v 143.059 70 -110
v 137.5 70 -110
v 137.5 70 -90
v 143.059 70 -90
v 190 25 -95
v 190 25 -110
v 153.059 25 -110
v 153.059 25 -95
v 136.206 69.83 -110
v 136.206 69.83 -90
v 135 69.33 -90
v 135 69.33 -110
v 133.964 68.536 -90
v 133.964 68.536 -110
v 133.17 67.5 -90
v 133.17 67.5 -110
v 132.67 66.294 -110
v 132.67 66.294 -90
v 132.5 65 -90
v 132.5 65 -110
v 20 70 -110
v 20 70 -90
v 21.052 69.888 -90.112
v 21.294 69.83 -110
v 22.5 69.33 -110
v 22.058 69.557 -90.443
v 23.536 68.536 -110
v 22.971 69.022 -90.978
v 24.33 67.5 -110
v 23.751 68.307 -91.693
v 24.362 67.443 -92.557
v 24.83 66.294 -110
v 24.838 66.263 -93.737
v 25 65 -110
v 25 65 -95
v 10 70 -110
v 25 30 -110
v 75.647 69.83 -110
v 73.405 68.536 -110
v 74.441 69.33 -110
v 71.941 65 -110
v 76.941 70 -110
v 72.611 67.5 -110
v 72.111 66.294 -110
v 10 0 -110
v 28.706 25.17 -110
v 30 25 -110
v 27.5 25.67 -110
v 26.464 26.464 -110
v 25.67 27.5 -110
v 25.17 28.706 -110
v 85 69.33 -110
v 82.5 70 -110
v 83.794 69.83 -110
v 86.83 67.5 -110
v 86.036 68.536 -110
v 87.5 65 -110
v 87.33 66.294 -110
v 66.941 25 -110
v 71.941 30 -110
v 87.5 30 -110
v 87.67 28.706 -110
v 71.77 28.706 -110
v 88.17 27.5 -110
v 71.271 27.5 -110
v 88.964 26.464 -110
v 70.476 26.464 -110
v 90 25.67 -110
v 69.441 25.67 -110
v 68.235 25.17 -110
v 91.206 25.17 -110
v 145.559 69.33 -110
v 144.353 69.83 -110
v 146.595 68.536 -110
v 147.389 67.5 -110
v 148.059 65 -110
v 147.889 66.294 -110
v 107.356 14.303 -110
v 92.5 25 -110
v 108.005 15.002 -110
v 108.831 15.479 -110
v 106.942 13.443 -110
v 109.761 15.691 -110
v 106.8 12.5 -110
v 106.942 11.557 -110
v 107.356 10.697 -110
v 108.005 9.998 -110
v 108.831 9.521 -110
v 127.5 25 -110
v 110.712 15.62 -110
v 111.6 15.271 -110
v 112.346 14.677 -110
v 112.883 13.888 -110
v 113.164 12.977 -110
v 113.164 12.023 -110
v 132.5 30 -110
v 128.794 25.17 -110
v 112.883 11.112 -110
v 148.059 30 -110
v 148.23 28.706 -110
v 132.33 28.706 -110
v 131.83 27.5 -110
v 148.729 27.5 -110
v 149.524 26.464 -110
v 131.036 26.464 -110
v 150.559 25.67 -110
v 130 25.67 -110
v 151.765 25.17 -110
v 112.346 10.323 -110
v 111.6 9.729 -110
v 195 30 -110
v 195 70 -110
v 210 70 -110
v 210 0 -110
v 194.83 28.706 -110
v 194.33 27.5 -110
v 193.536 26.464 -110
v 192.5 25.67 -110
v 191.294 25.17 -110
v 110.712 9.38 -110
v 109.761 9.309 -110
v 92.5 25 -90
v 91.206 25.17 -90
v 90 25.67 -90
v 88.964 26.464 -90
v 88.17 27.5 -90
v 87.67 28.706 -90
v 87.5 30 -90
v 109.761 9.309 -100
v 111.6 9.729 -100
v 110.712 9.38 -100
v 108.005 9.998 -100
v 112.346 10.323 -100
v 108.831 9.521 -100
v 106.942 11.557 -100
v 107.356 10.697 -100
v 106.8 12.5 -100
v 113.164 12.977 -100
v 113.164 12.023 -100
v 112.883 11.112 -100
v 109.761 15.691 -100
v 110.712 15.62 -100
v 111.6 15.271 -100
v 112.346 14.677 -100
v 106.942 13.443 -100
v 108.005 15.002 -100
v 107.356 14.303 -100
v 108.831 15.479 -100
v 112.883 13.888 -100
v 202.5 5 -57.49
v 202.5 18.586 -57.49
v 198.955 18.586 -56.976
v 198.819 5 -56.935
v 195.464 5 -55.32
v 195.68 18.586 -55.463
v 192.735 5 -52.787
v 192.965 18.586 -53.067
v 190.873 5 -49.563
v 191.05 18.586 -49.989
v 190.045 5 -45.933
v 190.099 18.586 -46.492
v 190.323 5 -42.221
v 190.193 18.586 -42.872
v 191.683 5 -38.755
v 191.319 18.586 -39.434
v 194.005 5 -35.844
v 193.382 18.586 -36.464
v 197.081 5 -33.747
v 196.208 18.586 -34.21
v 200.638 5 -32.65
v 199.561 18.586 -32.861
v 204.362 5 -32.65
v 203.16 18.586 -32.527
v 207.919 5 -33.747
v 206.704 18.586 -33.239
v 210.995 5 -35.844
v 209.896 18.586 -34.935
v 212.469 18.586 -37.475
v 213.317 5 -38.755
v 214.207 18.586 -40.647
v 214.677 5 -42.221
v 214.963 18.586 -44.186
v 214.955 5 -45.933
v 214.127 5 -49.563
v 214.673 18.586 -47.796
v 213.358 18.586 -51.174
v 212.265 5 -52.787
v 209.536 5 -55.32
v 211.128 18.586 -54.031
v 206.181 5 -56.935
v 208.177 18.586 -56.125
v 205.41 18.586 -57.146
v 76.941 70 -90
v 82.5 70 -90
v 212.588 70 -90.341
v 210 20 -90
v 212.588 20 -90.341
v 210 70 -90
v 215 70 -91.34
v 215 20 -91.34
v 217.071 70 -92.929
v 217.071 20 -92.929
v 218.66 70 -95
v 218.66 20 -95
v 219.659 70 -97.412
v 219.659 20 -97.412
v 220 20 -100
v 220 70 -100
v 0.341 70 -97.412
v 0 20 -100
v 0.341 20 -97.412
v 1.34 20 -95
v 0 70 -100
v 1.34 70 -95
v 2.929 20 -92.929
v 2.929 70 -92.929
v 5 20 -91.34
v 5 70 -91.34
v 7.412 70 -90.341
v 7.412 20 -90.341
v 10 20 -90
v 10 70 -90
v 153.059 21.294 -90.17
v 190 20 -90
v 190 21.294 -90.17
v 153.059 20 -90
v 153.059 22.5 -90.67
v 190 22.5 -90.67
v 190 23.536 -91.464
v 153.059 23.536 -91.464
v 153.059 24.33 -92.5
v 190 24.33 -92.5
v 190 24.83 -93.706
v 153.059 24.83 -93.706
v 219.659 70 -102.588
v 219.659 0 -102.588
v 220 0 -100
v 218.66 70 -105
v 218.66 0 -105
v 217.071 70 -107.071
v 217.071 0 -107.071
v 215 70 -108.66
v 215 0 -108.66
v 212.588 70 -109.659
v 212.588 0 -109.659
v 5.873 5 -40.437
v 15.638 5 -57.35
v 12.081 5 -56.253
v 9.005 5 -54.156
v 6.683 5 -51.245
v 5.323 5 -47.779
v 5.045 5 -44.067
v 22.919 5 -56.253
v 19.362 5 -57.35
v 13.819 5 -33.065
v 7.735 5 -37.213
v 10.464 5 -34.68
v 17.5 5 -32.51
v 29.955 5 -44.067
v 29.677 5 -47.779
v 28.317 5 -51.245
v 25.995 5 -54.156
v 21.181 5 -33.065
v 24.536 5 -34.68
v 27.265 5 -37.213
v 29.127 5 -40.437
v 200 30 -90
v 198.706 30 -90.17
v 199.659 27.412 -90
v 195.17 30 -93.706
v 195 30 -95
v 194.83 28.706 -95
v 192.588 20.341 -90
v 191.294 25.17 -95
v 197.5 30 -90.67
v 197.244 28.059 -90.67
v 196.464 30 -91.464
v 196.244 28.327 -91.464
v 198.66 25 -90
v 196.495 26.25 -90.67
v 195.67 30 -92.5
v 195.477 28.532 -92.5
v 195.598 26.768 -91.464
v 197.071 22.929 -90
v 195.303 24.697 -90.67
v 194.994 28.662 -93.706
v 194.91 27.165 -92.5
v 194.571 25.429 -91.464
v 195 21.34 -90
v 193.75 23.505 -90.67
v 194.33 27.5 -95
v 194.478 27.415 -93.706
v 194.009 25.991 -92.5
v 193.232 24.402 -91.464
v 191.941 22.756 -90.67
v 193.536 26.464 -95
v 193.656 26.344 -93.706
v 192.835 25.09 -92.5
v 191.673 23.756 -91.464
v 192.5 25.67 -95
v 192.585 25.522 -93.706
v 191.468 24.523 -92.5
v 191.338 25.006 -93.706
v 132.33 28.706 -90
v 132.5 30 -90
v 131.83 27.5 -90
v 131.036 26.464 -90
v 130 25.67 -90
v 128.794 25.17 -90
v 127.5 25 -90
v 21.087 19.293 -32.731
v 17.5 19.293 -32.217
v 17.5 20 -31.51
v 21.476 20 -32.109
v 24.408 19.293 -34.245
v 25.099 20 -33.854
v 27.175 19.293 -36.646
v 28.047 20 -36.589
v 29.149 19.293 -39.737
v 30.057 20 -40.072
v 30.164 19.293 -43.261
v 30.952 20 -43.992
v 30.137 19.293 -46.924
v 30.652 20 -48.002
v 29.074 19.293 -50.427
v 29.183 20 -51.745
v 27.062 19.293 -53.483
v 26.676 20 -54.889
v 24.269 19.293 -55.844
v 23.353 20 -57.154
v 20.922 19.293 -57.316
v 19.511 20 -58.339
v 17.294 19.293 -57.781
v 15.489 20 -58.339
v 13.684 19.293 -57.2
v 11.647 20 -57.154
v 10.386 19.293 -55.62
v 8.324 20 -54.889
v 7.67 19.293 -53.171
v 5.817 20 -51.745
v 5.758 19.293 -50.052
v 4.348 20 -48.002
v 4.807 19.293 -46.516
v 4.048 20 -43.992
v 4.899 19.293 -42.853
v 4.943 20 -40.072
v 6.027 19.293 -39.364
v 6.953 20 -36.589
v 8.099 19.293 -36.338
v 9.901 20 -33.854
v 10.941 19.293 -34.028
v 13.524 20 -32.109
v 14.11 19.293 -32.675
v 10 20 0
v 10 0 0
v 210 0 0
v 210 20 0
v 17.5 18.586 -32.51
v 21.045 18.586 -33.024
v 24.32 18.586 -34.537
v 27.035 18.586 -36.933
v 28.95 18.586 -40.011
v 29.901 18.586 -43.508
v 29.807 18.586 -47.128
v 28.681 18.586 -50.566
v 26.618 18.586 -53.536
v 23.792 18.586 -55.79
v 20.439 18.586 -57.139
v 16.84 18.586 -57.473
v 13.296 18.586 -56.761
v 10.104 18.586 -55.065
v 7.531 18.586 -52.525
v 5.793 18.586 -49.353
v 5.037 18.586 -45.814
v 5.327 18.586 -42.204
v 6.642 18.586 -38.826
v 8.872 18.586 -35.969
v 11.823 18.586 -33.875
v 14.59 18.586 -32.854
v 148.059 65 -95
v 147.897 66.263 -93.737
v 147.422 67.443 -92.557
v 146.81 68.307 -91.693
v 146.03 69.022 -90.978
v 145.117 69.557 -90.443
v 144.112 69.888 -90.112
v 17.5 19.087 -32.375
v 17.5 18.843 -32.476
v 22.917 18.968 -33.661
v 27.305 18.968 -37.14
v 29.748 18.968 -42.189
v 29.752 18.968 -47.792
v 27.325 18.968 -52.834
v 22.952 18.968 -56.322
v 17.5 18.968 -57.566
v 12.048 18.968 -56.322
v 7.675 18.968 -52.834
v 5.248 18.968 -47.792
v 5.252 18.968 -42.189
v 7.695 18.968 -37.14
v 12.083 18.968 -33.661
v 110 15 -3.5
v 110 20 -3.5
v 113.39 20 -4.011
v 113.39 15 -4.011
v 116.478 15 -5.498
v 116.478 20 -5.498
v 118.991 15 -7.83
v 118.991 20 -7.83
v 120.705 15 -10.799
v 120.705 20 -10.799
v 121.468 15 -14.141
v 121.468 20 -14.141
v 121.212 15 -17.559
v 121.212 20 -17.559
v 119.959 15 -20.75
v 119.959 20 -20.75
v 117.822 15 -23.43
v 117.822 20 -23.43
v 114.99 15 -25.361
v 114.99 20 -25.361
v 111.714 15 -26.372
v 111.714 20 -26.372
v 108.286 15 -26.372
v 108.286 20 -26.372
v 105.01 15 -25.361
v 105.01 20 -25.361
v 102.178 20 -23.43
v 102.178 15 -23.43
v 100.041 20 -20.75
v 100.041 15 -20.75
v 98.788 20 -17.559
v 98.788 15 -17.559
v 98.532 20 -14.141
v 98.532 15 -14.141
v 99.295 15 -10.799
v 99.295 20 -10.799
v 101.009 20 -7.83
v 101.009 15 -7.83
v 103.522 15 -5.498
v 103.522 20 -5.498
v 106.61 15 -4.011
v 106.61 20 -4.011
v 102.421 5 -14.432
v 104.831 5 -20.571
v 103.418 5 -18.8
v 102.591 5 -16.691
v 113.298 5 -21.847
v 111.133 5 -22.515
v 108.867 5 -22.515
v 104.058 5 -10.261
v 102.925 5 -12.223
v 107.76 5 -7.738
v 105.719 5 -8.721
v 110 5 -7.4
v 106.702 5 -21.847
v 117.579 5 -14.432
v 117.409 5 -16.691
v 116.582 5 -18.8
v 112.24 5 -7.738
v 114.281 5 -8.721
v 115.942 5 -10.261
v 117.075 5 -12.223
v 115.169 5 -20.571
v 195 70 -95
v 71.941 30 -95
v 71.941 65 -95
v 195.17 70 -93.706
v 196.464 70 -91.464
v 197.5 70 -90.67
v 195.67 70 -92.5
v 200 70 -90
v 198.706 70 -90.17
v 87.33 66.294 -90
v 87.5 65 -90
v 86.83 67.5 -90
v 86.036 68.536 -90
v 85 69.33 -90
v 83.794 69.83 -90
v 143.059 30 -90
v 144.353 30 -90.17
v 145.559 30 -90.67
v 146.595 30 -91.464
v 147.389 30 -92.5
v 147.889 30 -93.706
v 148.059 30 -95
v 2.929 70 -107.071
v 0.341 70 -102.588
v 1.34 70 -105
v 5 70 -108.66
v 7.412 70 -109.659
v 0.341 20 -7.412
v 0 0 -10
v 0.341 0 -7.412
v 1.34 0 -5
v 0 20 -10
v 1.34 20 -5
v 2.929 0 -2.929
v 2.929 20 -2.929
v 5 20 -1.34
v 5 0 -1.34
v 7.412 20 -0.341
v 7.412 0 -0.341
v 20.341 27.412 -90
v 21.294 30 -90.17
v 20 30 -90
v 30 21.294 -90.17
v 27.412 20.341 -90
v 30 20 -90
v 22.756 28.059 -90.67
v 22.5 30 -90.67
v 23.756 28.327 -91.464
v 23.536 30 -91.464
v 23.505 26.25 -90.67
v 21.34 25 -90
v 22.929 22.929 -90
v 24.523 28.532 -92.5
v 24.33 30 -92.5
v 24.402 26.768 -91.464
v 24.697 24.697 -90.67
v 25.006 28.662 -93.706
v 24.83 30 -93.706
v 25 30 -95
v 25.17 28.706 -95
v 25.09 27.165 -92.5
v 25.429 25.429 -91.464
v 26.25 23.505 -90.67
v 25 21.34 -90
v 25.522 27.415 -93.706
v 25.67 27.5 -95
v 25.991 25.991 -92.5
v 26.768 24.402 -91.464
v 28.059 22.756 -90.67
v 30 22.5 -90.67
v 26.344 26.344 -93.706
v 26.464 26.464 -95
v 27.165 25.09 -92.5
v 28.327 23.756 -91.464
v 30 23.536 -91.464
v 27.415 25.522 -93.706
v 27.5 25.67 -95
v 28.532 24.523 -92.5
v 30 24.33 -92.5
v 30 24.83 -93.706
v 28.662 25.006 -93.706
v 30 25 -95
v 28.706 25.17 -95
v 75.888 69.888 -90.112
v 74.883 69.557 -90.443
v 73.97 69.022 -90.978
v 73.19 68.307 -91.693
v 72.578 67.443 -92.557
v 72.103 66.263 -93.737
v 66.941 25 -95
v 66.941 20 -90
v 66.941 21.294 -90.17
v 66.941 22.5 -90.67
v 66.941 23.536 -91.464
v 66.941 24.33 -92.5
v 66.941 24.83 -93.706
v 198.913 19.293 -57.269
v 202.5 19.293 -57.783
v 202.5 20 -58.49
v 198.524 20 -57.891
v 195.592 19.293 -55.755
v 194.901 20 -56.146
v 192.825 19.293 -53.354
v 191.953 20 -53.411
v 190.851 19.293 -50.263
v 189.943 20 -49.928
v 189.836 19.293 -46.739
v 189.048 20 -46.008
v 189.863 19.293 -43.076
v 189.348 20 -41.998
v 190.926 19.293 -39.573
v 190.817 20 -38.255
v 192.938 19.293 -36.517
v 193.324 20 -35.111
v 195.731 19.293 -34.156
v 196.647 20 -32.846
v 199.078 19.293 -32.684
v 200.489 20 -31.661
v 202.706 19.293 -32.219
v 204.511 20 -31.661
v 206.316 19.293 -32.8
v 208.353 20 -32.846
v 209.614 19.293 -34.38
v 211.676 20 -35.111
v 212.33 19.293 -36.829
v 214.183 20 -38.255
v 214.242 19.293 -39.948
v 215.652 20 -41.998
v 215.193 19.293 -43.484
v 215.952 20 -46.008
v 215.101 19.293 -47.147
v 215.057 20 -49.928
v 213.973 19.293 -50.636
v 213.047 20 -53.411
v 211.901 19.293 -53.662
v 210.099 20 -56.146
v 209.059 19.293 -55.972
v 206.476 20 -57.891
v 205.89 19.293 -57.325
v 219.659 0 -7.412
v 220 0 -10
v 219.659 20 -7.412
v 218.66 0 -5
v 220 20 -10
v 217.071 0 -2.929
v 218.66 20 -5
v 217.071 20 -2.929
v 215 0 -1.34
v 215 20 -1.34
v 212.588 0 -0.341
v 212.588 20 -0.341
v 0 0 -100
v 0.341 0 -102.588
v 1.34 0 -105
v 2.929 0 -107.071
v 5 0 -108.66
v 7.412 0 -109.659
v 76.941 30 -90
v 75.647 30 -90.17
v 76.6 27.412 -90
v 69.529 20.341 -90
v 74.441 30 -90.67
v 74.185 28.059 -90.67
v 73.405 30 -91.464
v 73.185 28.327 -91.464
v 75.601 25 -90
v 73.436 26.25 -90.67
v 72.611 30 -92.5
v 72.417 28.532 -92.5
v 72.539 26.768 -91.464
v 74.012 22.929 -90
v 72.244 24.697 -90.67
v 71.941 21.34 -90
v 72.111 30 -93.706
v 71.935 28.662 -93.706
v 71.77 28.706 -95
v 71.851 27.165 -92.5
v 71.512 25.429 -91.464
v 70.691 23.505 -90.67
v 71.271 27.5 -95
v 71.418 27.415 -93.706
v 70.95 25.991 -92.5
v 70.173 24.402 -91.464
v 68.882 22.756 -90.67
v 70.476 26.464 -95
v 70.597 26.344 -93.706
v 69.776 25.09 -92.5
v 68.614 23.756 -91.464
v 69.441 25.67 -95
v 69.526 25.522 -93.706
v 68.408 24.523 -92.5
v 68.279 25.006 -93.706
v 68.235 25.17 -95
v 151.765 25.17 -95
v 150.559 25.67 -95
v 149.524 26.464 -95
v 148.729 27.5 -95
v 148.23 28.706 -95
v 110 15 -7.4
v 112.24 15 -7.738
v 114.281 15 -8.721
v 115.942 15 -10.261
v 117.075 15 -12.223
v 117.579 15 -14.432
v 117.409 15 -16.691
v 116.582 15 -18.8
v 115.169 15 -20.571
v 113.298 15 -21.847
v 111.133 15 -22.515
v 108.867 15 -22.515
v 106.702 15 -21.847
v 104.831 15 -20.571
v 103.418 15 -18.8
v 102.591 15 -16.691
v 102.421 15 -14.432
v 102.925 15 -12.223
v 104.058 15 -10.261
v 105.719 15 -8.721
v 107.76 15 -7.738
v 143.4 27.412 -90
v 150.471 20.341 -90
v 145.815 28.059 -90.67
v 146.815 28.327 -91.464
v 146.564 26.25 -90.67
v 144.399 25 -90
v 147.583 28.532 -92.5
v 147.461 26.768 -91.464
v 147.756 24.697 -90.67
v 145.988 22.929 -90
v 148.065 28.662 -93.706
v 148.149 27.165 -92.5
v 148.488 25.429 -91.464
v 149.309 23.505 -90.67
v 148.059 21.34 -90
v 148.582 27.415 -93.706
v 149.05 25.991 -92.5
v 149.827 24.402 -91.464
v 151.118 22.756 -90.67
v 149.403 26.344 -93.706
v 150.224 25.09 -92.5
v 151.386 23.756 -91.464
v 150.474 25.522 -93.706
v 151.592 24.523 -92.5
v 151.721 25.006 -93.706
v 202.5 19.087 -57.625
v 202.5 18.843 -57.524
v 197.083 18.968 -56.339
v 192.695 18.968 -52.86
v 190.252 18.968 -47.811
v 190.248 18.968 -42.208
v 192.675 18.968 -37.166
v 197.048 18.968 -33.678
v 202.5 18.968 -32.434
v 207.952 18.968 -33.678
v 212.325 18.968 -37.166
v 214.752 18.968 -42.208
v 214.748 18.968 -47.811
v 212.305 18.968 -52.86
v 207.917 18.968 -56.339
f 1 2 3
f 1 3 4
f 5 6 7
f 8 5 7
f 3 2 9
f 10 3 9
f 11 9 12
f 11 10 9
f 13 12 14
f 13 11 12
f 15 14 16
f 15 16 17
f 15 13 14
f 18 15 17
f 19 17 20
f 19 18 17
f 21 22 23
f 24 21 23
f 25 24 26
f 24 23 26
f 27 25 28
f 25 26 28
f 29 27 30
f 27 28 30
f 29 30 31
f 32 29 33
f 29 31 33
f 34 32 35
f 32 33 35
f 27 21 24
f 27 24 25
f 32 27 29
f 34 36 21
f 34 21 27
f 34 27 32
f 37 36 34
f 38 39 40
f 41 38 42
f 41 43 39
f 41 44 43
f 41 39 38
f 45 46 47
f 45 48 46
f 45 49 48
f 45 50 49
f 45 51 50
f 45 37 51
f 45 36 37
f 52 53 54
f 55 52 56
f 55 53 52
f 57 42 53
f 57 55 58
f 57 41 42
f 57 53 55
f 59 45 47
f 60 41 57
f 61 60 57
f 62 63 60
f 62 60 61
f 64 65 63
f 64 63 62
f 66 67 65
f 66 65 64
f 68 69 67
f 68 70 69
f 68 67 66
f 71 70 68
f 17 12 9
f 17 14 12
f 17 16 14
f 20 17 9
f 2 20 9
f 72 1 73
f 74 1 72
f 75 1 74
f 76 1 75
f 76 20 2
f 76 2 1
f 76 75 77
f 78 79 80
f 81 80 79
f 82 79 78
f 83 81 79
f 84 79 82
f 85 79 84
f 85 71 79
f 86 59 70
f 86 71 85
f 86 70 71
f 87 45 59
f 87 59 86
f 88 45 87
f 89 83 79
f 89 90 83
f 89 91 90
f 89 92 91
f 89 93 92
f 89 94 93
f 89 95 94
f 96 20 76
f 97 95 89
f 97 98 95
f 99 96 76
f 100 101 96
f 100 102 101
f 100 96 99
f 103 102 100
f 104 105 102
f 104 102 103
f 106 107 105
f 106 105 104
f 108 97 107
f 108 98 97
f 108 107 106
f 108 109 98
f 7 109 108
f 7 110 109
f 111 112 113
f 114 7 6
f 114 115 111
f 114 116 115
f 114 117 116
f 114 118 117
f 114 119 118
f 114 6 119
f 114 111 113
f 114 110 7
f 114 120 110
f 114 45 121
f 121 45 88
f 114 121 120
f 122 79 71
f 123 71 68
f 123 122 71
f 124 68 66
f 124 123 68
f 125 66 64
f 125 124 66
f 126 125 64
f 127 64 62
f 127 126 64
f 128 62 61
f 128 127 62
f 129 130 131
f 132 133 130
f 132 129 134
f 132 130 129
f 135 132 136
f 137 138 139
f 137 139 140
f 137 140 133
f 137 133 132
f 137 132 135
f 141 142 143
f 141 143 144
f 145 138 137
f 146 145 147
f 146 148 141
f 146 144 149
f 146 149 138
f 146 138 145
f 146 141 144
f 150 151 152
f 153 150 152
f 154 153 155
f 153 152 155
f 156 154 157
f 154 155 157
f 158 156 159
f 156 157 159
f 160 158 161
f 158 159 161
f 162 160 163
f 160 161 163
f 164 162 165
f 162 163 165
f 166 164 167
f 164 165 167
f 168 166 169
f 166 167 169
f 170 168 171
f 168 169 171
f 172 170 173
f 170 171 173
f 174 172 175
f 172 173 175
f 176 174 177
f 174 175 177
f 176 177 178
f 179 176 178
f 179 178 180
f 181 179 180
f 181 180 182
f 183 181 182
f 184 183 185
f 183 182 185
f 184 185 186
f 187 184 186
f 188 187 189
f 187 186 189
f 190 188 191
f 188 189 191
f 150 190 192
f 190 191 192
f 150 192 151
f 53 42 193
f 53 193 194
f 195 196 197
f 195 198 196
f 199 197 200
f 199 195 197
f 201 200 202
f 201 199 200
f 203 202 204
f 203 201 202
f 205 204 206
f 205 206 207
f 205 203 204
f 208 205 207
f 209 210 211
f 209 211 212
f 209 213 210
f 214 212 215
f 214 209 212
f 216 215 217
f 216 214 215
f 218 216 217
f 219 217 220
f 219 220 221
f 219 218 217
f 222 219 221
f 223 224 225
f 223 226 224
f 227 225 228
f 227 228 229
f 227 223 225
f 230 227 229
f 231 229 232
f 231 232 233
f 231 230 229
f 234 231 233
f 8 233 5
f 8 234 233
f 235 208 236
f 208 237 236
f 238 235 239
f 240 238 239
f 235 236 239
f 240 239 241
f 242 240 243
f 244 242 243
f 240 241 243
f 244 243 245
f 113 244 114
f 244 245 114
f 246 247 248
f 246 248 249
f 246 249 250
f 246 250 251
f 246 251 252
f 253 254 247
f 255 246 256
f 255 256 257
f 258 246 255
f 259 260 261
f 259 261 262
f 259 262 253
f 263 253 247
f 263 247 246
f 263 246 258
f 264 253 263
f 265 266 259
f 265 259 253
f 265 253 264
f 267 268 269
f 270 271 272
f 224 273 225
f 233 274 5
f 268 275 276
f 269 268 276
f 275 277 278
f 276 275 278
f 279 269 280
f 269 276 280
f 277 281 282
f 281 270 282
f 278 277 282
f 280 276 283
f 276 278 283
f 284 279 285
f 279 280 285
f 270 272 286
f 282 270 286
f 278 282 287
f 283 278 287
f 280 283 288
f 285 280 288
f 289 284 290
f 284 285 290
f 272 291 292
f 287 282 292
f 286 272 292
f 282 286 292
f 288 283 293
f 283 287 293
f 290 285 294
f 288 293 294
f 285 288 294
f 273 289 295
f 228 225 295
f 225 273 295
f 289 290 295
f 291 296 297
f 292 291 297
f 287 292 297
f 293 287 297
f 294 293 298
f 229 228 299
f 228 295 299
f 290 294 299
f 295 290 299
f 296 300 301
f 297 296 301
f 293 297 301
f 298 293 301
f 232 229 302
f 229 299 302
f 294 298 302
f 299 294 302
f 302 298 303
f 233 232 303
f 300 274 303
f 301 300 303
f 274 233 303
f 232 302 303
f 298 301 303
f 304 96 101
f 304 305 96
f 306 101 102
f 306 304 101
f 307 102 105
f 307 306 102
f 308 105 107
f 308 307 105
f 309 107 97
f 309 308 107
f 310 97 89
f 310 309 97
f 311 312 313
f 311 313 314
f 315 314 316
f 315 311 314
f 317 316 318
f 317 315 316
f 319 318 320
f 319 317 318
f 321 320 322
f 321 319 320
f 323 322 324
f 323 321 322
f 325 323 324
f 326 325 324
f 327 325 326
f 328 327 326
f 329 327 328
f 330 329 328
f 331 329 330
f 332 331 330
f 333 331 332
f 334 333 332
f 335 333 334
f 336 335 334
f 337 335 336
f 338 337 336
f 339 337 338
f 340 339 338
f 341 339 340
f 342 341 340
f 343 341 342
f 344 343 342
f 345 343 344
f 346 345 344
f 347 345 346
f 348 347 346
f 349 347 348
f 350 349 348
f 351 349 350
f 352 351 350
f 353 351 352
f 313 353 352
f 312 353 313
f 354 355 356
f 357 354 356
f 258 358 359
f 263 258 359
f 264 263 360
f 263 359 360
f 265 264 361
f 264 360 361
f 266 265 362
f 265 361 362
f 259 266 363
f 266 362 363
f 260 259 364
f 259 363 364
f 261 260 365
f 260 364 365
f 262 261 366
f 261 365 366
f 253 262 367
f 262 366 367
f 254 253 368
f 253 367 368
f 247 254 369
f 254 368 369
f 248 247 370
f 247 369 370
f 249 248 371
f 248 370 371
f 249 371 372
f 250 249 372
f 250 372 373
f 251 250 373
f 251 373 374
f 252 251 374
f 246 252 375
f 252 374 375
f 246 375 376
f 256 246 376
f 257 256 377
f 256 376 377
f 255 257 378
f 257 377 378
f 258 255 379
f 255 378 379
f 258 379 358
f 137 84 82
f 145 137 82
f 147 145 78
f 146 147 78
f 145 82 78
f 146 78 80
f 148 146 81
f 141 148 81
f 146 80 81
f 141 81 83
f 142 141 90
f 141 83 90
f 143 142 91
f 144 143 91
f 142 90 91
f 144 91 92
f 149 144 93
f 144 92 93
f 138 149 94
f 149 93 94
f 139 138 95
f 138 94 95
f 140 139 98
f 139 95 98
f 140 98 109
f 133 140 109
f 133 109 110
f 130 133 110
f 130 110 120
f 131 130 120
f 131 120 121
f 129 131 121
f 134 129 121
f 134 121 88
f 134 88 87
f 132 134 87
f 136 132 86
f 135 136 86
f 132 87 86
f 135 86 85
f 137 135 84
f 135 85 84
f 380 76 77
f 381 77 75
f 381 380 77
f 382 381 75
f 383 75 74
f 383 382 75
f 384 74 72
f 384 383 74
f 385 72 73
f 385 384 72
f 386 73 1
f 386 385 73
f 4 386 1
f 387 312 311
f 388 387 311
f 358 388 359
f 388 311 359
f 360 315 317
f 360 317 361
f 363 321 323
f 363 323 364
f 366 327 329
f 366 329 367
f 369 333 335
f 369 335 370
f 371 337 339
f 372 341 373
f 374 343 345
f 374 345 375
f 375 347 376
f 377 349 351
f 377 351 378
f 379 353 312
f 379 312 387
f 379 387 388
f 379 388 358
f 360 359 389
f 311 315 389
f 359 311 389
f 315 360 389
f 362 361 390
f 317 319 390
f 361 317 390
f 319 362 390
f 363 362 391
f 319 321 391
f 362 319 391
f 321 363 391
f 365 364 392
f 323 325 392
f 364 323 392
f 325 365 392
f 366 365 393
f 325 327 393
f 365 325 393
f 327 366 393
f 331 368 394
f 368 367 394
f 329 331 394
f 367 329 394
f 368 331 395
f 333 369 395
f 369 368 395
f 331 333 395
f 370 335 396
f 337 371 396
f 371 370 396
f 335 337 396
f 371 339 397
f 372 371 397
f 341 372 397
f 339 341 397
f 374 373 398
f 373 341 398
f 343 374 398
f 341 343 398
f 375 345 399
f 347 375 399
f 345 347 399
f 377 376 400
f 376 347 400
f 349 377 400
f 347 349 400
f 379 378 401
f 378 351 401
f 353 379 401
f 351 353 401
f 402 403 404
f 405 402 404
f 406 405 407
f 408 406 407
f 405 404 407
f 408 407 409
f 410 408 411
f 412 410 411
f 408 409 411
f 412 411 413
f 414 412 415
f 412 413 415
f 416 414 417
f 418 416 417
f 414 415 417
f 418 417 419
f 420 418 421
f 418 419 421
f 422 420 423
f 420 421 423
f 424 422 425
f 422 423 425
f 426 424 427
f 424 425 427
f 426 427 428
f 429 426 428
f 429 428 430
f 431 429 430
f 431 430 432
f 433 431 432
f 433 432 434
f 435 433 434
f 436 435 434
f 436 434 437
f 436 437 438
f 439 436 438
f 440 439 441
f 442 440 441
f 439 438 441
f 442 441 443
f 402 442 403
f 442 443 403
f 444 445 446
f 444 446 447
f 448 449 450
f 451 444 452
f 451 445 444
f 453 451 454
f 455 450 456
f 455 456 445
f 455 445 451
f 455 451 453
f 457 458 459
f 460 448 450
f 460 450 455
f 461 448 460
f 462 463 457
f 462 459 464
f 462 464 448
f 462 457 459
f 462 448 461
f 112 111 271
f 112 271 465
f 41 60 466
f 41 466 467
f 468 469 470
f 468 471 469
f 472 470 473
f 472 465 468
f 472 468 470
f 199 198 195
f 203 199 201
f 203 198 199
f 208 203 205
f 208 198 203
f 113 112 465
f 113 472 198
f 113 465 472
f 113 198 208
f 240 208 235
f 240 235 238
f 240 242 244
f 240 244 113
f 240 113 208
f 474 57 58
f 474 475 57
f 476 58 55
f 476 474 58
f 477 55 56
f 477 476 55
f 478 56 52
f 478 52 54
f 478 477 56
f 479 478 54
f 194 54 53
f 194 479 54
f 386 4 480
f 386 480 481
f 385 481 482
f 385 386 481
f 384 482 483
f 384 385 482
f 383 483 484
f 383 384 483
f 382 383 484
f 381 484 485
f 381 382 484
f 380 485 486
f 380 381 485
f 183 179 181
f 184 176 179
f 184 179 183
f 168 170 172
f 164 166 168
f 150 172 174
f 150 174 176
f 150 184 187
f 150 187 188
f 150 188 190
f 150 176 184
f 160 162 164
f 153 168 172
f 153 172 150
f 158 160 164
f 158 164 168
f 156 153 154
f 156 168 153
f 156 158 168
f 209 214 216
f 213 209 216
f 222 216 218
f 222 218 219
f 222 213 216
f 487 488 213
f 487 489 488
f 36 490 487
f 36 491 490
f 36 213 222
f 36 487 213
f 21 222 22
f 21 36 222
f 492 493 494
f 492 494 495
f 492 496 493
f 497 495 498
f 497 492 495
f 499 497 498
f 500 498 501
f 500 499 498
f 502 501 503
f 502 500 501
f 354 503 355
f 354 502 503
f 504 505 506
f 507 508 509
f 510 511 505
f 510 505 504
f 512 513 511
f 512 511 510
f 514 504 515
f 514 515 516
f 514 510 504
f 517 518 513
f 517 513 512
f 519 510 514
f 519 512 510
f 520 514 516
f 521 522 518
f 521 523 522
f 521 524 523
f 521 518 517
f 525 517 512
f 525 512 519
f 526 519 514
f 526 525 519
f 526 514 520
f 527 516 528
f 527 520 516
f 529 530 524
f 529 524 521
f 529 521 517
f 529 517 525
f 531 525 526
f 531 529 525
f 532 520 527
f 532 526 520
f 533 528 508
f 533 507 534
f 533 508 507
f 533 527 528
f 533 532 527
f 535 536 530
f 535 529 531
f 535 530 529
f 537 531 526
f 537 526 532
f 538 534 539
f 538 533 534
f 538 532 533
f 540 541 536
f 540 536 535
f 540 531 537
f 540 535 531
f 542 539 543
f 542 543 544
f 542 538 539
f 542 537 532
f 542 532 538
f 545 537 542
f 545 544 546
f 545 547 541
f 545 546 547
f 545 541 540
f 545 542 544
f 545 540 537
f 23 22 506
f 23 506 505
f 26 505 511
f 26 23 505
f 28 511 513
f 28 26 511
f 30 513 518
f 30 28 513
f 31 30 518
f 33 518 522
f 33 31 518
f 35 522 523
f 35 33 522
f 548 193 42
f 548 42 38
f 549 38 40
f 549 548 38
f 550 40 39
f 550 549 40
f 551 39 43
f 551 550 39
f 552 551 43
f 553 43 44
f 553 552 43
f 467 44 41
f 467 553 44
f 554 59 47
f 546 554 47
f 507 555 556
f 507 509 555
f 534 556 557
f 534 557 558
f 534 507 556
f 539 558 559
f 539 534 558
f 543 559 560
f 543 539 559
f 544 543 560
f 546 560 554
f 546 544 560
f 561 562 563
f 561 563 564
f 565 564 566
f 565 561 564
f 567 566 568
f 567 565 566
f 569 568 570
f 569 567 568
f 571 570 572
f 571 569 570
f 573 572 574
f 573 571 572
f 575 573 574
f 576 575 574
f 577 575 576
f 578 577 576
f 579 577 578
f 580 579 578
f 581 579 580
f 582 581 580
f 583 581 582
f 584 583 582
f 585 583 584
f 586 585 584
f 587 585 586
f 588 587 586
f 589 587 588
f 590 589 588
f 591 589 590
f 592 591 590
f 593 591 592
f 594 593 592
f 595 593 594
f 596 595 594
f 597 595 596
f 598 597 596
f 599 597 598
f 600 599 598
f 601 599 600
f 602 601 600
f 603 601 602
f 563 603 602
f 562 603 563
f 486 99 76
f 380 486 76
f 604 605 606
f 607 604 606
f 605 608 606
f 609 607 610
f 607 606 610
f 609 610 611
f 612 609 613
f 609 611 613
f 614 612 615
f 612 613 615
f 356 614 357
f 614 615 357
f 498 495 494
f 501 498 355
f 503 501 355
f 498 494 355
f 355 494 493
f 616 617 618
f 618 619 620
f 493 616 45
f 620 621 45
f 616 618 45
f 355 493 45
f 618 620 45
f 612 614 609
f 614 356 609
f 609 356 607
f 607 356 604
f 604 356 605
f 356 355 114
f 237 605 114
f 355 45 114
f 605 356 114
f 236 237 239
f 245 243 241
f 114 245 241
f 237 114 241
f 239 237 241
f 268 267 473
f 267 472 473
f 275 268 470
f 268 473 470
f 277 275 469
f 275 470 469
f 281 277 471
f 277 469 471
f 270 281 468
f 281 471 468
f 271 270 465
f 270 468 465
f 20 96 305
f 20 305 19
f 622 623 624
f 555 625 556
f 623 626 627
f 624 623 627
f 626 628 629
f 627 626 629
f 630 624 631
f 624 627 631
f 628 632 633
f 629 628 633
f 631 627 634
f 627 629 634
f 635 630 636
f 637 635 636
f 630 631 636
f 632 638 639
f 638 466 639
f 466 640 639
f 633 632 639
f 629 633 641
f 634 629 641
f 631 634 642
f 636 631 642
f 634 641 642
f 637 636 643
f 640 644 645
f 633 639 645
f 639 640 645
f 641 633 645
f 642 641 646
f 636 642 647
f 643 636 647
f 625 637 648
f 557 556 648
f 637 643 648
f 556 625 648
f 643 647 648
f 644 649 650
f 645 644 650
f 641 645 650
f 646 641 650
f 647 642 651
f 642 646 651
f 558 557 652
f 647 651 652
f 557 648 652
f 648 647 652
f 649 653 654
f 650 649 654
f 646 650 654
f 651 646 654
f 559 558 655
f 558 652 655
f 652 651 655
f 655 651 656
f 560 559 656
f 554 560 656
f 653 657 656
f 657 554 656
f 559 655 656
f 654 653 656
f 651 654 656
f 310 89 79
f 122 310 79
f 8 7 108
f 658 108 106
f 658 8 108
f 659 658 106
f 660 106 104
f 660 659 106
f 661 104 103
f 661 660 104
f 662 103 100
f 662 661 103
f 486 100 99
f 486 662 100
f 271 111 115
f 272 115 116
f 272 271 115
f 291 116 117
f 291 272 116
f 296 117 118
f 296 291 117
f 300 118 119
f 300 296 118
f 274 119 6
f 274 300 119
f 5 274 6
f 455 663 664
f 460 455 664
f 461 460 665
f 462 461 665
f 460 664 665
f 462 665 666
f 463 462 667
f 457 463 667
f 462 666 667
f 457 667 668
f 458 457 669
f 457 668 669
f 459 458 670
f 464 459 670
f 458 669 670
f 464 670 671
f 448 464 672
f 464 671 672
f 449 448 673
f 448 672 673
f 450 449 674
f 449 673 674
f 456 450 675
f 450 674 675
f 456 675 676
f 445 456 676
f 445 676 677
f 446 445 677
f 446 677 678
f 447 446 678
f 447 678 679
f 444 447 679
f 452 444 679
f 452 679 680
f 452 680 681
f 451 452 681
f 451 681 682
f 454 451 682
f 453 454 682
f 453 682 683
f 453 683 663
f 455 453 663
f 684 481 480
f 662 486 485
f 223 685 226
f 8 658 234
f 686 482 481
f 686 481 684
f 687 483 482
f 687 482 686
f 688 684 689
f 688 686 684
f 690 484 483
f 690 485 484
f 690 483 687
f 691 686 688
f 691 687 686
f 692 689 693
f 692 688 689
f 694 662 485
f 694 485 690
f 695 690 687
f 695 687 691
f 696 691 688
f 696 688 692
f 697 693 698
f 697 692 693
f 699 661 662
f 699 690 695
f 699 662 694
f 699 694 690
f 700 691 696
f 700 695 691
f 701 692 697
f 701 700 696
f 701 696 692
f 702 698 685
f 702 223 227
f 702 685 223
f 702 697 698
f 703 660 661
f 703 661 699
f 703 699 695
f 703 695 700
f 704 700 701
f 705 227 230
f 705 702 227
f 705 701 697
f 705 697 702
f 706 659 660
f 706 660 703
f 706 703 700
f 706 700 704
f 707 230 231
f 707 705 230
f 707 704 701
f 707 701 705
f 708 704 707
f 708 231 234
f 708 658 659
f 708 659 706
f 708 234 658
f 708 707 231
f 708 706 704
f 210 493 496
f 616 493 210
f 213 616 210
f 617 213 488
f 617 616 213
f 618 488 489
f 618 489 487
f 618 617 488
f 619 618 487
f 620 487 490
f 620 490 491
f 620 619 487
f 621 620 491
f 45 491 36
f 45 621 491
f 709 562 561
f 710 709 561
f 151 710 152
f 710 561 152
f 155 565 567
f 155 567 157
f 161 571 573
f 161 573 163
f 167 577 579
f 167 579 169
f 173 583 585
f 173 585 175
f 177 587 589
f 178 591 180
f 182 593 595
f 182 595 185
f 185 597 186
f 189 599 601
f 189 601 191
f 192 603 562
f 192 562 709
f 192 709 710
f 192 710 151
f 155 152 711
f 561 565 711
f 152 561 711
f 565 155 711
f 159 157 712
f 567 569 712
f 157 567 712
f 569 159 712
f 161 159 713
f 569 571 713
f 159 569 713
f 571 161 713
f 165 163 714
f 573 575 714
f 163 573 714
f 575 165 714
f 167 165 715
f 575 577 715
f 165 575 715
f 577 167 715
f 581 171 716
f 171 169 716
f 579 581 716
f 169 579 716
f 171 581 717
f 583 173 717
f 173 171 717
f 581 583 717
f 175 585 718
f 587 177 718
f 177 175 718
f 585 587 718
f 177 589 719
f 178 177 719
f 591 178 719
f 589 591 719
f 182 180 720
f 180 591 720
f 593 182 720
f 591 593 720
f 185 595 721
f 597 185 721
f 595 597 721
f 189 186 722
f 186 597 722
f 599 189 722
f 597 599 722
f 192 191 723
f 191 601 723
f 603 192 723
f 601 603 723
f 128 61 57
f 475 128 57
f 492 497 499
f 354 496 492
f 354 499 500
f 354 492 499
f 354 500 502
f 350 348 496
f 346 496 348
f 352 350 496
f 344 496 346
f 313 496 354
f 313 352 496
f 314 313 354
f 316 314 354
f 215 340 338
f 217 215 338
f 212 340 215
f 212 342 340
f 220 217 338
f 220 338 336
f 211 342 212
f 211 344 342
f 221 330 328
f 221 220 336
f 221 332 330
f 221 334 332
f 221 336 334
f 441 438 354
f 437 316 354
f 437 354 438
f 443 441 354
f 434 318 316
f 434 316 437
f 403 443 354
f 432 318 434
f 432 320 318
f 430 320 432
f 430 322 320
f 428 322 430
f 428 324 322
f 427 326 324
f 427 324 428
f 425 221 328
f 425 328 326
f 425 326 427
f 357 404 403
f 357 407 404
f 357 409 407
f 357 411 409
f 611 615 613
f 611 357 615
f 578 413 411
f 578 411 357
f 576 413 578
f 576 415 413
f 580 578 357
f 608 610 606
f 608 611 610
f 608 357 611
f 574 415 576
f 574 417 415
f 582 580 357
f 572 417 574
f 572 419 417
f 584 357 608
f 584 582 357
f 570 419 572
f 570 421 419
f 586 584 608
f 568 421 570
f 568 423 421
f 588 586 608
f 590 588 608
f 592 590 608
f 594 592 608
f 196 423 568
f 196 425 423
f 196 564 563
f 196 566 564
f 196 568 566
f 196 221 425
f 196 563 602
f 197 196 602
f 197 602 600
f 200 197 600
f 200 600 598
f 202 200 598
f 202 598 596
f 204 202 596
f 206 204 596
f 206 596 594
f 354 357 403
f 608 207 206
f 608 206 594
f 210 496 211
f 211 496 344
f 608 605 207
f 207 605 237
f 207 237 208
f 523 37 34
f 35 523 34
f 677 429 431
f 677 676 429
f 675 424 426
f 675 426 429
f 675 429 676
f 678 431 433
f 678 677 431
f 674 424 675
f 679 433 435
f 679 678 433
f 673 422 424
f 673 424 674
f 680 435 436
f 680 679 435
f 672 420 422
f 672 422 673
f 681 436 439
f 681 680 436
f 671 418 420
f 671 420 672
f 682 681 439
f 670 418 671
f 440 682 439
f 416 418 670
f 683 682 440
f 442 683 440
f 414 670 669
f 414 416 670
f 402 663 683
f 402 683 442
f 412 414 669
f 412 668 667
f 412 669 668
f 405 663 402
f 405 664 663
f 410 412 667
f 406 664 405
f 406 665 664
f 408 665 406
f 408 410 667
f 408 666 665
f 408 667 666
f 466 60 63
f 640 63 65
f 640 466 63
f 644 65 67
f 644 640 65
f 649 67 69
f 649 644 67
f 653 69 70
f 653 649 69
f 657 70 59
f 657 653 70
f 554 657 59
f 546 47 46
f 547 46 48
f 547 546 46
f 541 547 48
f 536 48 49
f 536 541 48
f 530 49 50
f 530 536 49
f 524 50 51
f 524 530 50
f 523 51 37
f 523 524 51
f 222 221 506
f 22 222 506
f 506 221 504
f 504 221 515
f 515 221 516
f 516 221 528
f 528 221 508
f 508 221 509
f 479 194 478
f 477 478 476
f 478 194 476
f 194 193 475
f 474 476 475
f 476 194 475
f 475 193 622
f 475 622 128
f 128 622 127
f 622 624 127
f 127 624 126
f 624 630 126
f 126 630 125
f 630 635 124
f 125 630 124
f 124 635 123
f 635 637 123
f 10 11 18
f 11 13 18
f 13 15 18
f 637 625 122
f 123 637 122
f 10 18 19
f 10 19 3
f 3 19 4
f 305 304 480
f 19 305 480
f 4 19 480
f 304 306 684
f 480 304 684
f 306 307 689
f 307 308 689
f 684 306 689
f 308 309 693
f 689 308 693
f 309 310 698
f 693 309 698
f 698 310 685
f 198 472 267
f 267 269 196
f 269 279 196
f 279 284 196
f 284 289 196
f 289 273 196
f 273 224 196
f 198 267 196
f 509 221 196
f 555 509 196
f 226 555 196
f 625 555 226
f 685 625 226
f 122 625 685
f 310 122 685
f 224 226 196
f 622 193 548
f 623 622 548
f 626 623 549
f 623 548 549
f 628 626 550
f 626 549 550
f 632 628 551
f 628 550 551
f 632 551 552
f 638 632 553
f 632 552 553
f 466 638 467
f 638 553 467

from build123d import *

# Parameters (mm, degrees)
SKETCH1_W           = 220
SKETCH1_H           = 110
BOSS_EXTRUDE1_DEPTH = 20
SKETCH2_R           = 12.49
SKETCH2_R_2         = 7.6
CUT_EXTRUDE1_DEPTH  = 15
SKETCH3_W           = 220
SKETCH3_H           = 20
BOSS_EXTRUDE2_DEPTH = 50
CHAMFER1_SIZE       = 1
FILLET1_R           = 1
FILLET2_R           = 10
SKETCH4_R           = 11.5
CUT_EXTRUDE2_DEPTH  = 5
SKETCH5_W           = 46.94076836
SKETCH5_H           = 60
SKETCH5_W_2         = 45
SKETCH5_H_2         = 90
CUT_EXTRUDE3_DEPTH  = 256.734237051
FILLET4_R           = 5
SKETCH6_R           = 3.2
CUT_EXTRUDE4_DEPTH  = 10


with BuildPart() as part:
    # Sketch1 → Boss-Extrude1 (new body)
    with BuildSketch(Plane(origin=(0, 0, 0), x_dir=(1, 0, 0), z_dir=(0, 1, 0))):
        with Locations((110, 55)):
            Rectangle(SKETCH1_W, SKETCH1_H)
    extrude(amount=BOSS_EXTRUDE1_DEPTH)

    # Sketch2 → Cut-Extrude1 (cut)
    with BuildSketch(Plane(origin=(0, 20, 0), x_dir=(1, 0, 0), z_dir=(0, 1, 0))):
        with Locations(Location((17.5, 45, 0), (0, 0, 270))):
            Circle(SKETCH2_R)
        with Locations(Location((202.5, 45, 0), (0, 0, 90))):
            Circle(SKETCH2_R)
        with Locations(Location((110, 15, 0), (0, 0, 270))):
            Circle(SKETCH2_R_2)
    extrude(amount=-CUT_EXTRUDE1_DEPTH, mode=Mode.SUBTRACT)

    # Sketch3 → Boss-Extrude2 (add)
    with BuildSketch(Plane(origin=(0, 20, 0), x_dir=(1, 0, 0), z_dir=(0, 1, 0))):
        with Locations((110, 100)):
            Rectangle(SKETCH3_W, SKETCH3_H)
    extrude(amount=BOSS_EXTRUDE2_DEPTH)

    # Chamfer1
    chamfer1_edges = [part.edges().sort_by_distance(p)[0] for p in [
        (17.5, 20, -57.49),
        (202.5, 20, -32.51),
    ]]
    chamfer(chamfer1_edges, length=CHAMFER1_SIZE)

    # Fillet1
    fillet1_edges = [part.edges().sort_by_distance(p)[0] for p in [
        (202.5, 19, -32.51),
        (17.5, 19, -57.49),
    ]]
    fillet(fillet1_edges, radius=FILLET1_R)

    # Fillet2
    fillet2_edges = [part.edges().sort_by_distance(p)[0] for p in [
        (220, 45, -90),
        (0, 45, -90),
        (0, 35, -110),
        (0, 10, 0),
        (220, 35, -110),
        (220, 10, 0),
    ]]
    fillet(fillet2_edges, radius=FILLET2_R - 0.0001)  # a hair under: the kernel refuses the full size

    # Sketch4 → Cut-Extrude2 (cut)
    with BuildSketch(Plane(origin=(0, 20, 0), x_dir=(1, 0, 0), z_dir=(0, 1, 0))):
        with Locations(Location((110, 15, 0), (0, 0, 270))):
            Circle(SKETCH4_R)
    extrude(amount=-CUT_EXTRUDE2_DEPTH, mode=Mode.SUBTRACT)

    # Sketch5 → Cut-Extrude3 (cut, through all)
    with BuildSketch(Plane(origin=(0, 0, -110), x_dir=(-1, 0, 0), z_dir=(0, 0, -1))):
        with Locations((-171.52961582, 55)):
            Rectangle(SKETCH5_W, SKETCH5_H)
        with Locations((-48.47038418, 55)):
            Rectangle(SKETCH5_W, SKETCH5_H)
        with Locations((-110, 70)):
            Rectangle(SKETCH5_W_2, SKETCH5_H_2)
    extrude(amount=-CUT_EXTRUDE3_DEPTH, mode=Mode.SUBTRACT)

    # Fillet4
    fillet4_edges = [part.edges().sort_by_distance(p)[0] for p in [
        (195, 47.5, -90),
        (148.05923164, 47.5, -90),
        (25, 47.5, -90),
        (71.94076836, 47.5, -90),
        (171.52961582, 25, -90),
        (48.47038418, 25, -90),
        (25, 70, -100),
        (25, 25, -100),
        (71.94076836, 25, -100),
        (71.94076836, 70, -100),
        (87.5, 70, -100),
        (87.5, 25, -100),
        (132.5, 25, -100),
        (132.5, 70, -100),
        (148.05923164, 70, -100),
        (148.05923164, 25, -100),
        (195, 25, -100),
    ]]
    fillet(fillet4_edges, radius=FILLET4_R - 0.0001)  # a hair under: the kernel refuses the full size

    # Sketch6 → Cut-Extrude4 (cut)
    with BuildSketch(Plane(origin=(0, 0, -110), x_dir=(-1, 0, 0), z_dir=(0, 0, -1))):
        with Locations((-110, 12.5)):
            Circle(SKETCH6_R)
    extrude(amount=-CUT_EXTRUDE4_DEPTH, mode=Mode.SUBTRACT)


solid = part.part
